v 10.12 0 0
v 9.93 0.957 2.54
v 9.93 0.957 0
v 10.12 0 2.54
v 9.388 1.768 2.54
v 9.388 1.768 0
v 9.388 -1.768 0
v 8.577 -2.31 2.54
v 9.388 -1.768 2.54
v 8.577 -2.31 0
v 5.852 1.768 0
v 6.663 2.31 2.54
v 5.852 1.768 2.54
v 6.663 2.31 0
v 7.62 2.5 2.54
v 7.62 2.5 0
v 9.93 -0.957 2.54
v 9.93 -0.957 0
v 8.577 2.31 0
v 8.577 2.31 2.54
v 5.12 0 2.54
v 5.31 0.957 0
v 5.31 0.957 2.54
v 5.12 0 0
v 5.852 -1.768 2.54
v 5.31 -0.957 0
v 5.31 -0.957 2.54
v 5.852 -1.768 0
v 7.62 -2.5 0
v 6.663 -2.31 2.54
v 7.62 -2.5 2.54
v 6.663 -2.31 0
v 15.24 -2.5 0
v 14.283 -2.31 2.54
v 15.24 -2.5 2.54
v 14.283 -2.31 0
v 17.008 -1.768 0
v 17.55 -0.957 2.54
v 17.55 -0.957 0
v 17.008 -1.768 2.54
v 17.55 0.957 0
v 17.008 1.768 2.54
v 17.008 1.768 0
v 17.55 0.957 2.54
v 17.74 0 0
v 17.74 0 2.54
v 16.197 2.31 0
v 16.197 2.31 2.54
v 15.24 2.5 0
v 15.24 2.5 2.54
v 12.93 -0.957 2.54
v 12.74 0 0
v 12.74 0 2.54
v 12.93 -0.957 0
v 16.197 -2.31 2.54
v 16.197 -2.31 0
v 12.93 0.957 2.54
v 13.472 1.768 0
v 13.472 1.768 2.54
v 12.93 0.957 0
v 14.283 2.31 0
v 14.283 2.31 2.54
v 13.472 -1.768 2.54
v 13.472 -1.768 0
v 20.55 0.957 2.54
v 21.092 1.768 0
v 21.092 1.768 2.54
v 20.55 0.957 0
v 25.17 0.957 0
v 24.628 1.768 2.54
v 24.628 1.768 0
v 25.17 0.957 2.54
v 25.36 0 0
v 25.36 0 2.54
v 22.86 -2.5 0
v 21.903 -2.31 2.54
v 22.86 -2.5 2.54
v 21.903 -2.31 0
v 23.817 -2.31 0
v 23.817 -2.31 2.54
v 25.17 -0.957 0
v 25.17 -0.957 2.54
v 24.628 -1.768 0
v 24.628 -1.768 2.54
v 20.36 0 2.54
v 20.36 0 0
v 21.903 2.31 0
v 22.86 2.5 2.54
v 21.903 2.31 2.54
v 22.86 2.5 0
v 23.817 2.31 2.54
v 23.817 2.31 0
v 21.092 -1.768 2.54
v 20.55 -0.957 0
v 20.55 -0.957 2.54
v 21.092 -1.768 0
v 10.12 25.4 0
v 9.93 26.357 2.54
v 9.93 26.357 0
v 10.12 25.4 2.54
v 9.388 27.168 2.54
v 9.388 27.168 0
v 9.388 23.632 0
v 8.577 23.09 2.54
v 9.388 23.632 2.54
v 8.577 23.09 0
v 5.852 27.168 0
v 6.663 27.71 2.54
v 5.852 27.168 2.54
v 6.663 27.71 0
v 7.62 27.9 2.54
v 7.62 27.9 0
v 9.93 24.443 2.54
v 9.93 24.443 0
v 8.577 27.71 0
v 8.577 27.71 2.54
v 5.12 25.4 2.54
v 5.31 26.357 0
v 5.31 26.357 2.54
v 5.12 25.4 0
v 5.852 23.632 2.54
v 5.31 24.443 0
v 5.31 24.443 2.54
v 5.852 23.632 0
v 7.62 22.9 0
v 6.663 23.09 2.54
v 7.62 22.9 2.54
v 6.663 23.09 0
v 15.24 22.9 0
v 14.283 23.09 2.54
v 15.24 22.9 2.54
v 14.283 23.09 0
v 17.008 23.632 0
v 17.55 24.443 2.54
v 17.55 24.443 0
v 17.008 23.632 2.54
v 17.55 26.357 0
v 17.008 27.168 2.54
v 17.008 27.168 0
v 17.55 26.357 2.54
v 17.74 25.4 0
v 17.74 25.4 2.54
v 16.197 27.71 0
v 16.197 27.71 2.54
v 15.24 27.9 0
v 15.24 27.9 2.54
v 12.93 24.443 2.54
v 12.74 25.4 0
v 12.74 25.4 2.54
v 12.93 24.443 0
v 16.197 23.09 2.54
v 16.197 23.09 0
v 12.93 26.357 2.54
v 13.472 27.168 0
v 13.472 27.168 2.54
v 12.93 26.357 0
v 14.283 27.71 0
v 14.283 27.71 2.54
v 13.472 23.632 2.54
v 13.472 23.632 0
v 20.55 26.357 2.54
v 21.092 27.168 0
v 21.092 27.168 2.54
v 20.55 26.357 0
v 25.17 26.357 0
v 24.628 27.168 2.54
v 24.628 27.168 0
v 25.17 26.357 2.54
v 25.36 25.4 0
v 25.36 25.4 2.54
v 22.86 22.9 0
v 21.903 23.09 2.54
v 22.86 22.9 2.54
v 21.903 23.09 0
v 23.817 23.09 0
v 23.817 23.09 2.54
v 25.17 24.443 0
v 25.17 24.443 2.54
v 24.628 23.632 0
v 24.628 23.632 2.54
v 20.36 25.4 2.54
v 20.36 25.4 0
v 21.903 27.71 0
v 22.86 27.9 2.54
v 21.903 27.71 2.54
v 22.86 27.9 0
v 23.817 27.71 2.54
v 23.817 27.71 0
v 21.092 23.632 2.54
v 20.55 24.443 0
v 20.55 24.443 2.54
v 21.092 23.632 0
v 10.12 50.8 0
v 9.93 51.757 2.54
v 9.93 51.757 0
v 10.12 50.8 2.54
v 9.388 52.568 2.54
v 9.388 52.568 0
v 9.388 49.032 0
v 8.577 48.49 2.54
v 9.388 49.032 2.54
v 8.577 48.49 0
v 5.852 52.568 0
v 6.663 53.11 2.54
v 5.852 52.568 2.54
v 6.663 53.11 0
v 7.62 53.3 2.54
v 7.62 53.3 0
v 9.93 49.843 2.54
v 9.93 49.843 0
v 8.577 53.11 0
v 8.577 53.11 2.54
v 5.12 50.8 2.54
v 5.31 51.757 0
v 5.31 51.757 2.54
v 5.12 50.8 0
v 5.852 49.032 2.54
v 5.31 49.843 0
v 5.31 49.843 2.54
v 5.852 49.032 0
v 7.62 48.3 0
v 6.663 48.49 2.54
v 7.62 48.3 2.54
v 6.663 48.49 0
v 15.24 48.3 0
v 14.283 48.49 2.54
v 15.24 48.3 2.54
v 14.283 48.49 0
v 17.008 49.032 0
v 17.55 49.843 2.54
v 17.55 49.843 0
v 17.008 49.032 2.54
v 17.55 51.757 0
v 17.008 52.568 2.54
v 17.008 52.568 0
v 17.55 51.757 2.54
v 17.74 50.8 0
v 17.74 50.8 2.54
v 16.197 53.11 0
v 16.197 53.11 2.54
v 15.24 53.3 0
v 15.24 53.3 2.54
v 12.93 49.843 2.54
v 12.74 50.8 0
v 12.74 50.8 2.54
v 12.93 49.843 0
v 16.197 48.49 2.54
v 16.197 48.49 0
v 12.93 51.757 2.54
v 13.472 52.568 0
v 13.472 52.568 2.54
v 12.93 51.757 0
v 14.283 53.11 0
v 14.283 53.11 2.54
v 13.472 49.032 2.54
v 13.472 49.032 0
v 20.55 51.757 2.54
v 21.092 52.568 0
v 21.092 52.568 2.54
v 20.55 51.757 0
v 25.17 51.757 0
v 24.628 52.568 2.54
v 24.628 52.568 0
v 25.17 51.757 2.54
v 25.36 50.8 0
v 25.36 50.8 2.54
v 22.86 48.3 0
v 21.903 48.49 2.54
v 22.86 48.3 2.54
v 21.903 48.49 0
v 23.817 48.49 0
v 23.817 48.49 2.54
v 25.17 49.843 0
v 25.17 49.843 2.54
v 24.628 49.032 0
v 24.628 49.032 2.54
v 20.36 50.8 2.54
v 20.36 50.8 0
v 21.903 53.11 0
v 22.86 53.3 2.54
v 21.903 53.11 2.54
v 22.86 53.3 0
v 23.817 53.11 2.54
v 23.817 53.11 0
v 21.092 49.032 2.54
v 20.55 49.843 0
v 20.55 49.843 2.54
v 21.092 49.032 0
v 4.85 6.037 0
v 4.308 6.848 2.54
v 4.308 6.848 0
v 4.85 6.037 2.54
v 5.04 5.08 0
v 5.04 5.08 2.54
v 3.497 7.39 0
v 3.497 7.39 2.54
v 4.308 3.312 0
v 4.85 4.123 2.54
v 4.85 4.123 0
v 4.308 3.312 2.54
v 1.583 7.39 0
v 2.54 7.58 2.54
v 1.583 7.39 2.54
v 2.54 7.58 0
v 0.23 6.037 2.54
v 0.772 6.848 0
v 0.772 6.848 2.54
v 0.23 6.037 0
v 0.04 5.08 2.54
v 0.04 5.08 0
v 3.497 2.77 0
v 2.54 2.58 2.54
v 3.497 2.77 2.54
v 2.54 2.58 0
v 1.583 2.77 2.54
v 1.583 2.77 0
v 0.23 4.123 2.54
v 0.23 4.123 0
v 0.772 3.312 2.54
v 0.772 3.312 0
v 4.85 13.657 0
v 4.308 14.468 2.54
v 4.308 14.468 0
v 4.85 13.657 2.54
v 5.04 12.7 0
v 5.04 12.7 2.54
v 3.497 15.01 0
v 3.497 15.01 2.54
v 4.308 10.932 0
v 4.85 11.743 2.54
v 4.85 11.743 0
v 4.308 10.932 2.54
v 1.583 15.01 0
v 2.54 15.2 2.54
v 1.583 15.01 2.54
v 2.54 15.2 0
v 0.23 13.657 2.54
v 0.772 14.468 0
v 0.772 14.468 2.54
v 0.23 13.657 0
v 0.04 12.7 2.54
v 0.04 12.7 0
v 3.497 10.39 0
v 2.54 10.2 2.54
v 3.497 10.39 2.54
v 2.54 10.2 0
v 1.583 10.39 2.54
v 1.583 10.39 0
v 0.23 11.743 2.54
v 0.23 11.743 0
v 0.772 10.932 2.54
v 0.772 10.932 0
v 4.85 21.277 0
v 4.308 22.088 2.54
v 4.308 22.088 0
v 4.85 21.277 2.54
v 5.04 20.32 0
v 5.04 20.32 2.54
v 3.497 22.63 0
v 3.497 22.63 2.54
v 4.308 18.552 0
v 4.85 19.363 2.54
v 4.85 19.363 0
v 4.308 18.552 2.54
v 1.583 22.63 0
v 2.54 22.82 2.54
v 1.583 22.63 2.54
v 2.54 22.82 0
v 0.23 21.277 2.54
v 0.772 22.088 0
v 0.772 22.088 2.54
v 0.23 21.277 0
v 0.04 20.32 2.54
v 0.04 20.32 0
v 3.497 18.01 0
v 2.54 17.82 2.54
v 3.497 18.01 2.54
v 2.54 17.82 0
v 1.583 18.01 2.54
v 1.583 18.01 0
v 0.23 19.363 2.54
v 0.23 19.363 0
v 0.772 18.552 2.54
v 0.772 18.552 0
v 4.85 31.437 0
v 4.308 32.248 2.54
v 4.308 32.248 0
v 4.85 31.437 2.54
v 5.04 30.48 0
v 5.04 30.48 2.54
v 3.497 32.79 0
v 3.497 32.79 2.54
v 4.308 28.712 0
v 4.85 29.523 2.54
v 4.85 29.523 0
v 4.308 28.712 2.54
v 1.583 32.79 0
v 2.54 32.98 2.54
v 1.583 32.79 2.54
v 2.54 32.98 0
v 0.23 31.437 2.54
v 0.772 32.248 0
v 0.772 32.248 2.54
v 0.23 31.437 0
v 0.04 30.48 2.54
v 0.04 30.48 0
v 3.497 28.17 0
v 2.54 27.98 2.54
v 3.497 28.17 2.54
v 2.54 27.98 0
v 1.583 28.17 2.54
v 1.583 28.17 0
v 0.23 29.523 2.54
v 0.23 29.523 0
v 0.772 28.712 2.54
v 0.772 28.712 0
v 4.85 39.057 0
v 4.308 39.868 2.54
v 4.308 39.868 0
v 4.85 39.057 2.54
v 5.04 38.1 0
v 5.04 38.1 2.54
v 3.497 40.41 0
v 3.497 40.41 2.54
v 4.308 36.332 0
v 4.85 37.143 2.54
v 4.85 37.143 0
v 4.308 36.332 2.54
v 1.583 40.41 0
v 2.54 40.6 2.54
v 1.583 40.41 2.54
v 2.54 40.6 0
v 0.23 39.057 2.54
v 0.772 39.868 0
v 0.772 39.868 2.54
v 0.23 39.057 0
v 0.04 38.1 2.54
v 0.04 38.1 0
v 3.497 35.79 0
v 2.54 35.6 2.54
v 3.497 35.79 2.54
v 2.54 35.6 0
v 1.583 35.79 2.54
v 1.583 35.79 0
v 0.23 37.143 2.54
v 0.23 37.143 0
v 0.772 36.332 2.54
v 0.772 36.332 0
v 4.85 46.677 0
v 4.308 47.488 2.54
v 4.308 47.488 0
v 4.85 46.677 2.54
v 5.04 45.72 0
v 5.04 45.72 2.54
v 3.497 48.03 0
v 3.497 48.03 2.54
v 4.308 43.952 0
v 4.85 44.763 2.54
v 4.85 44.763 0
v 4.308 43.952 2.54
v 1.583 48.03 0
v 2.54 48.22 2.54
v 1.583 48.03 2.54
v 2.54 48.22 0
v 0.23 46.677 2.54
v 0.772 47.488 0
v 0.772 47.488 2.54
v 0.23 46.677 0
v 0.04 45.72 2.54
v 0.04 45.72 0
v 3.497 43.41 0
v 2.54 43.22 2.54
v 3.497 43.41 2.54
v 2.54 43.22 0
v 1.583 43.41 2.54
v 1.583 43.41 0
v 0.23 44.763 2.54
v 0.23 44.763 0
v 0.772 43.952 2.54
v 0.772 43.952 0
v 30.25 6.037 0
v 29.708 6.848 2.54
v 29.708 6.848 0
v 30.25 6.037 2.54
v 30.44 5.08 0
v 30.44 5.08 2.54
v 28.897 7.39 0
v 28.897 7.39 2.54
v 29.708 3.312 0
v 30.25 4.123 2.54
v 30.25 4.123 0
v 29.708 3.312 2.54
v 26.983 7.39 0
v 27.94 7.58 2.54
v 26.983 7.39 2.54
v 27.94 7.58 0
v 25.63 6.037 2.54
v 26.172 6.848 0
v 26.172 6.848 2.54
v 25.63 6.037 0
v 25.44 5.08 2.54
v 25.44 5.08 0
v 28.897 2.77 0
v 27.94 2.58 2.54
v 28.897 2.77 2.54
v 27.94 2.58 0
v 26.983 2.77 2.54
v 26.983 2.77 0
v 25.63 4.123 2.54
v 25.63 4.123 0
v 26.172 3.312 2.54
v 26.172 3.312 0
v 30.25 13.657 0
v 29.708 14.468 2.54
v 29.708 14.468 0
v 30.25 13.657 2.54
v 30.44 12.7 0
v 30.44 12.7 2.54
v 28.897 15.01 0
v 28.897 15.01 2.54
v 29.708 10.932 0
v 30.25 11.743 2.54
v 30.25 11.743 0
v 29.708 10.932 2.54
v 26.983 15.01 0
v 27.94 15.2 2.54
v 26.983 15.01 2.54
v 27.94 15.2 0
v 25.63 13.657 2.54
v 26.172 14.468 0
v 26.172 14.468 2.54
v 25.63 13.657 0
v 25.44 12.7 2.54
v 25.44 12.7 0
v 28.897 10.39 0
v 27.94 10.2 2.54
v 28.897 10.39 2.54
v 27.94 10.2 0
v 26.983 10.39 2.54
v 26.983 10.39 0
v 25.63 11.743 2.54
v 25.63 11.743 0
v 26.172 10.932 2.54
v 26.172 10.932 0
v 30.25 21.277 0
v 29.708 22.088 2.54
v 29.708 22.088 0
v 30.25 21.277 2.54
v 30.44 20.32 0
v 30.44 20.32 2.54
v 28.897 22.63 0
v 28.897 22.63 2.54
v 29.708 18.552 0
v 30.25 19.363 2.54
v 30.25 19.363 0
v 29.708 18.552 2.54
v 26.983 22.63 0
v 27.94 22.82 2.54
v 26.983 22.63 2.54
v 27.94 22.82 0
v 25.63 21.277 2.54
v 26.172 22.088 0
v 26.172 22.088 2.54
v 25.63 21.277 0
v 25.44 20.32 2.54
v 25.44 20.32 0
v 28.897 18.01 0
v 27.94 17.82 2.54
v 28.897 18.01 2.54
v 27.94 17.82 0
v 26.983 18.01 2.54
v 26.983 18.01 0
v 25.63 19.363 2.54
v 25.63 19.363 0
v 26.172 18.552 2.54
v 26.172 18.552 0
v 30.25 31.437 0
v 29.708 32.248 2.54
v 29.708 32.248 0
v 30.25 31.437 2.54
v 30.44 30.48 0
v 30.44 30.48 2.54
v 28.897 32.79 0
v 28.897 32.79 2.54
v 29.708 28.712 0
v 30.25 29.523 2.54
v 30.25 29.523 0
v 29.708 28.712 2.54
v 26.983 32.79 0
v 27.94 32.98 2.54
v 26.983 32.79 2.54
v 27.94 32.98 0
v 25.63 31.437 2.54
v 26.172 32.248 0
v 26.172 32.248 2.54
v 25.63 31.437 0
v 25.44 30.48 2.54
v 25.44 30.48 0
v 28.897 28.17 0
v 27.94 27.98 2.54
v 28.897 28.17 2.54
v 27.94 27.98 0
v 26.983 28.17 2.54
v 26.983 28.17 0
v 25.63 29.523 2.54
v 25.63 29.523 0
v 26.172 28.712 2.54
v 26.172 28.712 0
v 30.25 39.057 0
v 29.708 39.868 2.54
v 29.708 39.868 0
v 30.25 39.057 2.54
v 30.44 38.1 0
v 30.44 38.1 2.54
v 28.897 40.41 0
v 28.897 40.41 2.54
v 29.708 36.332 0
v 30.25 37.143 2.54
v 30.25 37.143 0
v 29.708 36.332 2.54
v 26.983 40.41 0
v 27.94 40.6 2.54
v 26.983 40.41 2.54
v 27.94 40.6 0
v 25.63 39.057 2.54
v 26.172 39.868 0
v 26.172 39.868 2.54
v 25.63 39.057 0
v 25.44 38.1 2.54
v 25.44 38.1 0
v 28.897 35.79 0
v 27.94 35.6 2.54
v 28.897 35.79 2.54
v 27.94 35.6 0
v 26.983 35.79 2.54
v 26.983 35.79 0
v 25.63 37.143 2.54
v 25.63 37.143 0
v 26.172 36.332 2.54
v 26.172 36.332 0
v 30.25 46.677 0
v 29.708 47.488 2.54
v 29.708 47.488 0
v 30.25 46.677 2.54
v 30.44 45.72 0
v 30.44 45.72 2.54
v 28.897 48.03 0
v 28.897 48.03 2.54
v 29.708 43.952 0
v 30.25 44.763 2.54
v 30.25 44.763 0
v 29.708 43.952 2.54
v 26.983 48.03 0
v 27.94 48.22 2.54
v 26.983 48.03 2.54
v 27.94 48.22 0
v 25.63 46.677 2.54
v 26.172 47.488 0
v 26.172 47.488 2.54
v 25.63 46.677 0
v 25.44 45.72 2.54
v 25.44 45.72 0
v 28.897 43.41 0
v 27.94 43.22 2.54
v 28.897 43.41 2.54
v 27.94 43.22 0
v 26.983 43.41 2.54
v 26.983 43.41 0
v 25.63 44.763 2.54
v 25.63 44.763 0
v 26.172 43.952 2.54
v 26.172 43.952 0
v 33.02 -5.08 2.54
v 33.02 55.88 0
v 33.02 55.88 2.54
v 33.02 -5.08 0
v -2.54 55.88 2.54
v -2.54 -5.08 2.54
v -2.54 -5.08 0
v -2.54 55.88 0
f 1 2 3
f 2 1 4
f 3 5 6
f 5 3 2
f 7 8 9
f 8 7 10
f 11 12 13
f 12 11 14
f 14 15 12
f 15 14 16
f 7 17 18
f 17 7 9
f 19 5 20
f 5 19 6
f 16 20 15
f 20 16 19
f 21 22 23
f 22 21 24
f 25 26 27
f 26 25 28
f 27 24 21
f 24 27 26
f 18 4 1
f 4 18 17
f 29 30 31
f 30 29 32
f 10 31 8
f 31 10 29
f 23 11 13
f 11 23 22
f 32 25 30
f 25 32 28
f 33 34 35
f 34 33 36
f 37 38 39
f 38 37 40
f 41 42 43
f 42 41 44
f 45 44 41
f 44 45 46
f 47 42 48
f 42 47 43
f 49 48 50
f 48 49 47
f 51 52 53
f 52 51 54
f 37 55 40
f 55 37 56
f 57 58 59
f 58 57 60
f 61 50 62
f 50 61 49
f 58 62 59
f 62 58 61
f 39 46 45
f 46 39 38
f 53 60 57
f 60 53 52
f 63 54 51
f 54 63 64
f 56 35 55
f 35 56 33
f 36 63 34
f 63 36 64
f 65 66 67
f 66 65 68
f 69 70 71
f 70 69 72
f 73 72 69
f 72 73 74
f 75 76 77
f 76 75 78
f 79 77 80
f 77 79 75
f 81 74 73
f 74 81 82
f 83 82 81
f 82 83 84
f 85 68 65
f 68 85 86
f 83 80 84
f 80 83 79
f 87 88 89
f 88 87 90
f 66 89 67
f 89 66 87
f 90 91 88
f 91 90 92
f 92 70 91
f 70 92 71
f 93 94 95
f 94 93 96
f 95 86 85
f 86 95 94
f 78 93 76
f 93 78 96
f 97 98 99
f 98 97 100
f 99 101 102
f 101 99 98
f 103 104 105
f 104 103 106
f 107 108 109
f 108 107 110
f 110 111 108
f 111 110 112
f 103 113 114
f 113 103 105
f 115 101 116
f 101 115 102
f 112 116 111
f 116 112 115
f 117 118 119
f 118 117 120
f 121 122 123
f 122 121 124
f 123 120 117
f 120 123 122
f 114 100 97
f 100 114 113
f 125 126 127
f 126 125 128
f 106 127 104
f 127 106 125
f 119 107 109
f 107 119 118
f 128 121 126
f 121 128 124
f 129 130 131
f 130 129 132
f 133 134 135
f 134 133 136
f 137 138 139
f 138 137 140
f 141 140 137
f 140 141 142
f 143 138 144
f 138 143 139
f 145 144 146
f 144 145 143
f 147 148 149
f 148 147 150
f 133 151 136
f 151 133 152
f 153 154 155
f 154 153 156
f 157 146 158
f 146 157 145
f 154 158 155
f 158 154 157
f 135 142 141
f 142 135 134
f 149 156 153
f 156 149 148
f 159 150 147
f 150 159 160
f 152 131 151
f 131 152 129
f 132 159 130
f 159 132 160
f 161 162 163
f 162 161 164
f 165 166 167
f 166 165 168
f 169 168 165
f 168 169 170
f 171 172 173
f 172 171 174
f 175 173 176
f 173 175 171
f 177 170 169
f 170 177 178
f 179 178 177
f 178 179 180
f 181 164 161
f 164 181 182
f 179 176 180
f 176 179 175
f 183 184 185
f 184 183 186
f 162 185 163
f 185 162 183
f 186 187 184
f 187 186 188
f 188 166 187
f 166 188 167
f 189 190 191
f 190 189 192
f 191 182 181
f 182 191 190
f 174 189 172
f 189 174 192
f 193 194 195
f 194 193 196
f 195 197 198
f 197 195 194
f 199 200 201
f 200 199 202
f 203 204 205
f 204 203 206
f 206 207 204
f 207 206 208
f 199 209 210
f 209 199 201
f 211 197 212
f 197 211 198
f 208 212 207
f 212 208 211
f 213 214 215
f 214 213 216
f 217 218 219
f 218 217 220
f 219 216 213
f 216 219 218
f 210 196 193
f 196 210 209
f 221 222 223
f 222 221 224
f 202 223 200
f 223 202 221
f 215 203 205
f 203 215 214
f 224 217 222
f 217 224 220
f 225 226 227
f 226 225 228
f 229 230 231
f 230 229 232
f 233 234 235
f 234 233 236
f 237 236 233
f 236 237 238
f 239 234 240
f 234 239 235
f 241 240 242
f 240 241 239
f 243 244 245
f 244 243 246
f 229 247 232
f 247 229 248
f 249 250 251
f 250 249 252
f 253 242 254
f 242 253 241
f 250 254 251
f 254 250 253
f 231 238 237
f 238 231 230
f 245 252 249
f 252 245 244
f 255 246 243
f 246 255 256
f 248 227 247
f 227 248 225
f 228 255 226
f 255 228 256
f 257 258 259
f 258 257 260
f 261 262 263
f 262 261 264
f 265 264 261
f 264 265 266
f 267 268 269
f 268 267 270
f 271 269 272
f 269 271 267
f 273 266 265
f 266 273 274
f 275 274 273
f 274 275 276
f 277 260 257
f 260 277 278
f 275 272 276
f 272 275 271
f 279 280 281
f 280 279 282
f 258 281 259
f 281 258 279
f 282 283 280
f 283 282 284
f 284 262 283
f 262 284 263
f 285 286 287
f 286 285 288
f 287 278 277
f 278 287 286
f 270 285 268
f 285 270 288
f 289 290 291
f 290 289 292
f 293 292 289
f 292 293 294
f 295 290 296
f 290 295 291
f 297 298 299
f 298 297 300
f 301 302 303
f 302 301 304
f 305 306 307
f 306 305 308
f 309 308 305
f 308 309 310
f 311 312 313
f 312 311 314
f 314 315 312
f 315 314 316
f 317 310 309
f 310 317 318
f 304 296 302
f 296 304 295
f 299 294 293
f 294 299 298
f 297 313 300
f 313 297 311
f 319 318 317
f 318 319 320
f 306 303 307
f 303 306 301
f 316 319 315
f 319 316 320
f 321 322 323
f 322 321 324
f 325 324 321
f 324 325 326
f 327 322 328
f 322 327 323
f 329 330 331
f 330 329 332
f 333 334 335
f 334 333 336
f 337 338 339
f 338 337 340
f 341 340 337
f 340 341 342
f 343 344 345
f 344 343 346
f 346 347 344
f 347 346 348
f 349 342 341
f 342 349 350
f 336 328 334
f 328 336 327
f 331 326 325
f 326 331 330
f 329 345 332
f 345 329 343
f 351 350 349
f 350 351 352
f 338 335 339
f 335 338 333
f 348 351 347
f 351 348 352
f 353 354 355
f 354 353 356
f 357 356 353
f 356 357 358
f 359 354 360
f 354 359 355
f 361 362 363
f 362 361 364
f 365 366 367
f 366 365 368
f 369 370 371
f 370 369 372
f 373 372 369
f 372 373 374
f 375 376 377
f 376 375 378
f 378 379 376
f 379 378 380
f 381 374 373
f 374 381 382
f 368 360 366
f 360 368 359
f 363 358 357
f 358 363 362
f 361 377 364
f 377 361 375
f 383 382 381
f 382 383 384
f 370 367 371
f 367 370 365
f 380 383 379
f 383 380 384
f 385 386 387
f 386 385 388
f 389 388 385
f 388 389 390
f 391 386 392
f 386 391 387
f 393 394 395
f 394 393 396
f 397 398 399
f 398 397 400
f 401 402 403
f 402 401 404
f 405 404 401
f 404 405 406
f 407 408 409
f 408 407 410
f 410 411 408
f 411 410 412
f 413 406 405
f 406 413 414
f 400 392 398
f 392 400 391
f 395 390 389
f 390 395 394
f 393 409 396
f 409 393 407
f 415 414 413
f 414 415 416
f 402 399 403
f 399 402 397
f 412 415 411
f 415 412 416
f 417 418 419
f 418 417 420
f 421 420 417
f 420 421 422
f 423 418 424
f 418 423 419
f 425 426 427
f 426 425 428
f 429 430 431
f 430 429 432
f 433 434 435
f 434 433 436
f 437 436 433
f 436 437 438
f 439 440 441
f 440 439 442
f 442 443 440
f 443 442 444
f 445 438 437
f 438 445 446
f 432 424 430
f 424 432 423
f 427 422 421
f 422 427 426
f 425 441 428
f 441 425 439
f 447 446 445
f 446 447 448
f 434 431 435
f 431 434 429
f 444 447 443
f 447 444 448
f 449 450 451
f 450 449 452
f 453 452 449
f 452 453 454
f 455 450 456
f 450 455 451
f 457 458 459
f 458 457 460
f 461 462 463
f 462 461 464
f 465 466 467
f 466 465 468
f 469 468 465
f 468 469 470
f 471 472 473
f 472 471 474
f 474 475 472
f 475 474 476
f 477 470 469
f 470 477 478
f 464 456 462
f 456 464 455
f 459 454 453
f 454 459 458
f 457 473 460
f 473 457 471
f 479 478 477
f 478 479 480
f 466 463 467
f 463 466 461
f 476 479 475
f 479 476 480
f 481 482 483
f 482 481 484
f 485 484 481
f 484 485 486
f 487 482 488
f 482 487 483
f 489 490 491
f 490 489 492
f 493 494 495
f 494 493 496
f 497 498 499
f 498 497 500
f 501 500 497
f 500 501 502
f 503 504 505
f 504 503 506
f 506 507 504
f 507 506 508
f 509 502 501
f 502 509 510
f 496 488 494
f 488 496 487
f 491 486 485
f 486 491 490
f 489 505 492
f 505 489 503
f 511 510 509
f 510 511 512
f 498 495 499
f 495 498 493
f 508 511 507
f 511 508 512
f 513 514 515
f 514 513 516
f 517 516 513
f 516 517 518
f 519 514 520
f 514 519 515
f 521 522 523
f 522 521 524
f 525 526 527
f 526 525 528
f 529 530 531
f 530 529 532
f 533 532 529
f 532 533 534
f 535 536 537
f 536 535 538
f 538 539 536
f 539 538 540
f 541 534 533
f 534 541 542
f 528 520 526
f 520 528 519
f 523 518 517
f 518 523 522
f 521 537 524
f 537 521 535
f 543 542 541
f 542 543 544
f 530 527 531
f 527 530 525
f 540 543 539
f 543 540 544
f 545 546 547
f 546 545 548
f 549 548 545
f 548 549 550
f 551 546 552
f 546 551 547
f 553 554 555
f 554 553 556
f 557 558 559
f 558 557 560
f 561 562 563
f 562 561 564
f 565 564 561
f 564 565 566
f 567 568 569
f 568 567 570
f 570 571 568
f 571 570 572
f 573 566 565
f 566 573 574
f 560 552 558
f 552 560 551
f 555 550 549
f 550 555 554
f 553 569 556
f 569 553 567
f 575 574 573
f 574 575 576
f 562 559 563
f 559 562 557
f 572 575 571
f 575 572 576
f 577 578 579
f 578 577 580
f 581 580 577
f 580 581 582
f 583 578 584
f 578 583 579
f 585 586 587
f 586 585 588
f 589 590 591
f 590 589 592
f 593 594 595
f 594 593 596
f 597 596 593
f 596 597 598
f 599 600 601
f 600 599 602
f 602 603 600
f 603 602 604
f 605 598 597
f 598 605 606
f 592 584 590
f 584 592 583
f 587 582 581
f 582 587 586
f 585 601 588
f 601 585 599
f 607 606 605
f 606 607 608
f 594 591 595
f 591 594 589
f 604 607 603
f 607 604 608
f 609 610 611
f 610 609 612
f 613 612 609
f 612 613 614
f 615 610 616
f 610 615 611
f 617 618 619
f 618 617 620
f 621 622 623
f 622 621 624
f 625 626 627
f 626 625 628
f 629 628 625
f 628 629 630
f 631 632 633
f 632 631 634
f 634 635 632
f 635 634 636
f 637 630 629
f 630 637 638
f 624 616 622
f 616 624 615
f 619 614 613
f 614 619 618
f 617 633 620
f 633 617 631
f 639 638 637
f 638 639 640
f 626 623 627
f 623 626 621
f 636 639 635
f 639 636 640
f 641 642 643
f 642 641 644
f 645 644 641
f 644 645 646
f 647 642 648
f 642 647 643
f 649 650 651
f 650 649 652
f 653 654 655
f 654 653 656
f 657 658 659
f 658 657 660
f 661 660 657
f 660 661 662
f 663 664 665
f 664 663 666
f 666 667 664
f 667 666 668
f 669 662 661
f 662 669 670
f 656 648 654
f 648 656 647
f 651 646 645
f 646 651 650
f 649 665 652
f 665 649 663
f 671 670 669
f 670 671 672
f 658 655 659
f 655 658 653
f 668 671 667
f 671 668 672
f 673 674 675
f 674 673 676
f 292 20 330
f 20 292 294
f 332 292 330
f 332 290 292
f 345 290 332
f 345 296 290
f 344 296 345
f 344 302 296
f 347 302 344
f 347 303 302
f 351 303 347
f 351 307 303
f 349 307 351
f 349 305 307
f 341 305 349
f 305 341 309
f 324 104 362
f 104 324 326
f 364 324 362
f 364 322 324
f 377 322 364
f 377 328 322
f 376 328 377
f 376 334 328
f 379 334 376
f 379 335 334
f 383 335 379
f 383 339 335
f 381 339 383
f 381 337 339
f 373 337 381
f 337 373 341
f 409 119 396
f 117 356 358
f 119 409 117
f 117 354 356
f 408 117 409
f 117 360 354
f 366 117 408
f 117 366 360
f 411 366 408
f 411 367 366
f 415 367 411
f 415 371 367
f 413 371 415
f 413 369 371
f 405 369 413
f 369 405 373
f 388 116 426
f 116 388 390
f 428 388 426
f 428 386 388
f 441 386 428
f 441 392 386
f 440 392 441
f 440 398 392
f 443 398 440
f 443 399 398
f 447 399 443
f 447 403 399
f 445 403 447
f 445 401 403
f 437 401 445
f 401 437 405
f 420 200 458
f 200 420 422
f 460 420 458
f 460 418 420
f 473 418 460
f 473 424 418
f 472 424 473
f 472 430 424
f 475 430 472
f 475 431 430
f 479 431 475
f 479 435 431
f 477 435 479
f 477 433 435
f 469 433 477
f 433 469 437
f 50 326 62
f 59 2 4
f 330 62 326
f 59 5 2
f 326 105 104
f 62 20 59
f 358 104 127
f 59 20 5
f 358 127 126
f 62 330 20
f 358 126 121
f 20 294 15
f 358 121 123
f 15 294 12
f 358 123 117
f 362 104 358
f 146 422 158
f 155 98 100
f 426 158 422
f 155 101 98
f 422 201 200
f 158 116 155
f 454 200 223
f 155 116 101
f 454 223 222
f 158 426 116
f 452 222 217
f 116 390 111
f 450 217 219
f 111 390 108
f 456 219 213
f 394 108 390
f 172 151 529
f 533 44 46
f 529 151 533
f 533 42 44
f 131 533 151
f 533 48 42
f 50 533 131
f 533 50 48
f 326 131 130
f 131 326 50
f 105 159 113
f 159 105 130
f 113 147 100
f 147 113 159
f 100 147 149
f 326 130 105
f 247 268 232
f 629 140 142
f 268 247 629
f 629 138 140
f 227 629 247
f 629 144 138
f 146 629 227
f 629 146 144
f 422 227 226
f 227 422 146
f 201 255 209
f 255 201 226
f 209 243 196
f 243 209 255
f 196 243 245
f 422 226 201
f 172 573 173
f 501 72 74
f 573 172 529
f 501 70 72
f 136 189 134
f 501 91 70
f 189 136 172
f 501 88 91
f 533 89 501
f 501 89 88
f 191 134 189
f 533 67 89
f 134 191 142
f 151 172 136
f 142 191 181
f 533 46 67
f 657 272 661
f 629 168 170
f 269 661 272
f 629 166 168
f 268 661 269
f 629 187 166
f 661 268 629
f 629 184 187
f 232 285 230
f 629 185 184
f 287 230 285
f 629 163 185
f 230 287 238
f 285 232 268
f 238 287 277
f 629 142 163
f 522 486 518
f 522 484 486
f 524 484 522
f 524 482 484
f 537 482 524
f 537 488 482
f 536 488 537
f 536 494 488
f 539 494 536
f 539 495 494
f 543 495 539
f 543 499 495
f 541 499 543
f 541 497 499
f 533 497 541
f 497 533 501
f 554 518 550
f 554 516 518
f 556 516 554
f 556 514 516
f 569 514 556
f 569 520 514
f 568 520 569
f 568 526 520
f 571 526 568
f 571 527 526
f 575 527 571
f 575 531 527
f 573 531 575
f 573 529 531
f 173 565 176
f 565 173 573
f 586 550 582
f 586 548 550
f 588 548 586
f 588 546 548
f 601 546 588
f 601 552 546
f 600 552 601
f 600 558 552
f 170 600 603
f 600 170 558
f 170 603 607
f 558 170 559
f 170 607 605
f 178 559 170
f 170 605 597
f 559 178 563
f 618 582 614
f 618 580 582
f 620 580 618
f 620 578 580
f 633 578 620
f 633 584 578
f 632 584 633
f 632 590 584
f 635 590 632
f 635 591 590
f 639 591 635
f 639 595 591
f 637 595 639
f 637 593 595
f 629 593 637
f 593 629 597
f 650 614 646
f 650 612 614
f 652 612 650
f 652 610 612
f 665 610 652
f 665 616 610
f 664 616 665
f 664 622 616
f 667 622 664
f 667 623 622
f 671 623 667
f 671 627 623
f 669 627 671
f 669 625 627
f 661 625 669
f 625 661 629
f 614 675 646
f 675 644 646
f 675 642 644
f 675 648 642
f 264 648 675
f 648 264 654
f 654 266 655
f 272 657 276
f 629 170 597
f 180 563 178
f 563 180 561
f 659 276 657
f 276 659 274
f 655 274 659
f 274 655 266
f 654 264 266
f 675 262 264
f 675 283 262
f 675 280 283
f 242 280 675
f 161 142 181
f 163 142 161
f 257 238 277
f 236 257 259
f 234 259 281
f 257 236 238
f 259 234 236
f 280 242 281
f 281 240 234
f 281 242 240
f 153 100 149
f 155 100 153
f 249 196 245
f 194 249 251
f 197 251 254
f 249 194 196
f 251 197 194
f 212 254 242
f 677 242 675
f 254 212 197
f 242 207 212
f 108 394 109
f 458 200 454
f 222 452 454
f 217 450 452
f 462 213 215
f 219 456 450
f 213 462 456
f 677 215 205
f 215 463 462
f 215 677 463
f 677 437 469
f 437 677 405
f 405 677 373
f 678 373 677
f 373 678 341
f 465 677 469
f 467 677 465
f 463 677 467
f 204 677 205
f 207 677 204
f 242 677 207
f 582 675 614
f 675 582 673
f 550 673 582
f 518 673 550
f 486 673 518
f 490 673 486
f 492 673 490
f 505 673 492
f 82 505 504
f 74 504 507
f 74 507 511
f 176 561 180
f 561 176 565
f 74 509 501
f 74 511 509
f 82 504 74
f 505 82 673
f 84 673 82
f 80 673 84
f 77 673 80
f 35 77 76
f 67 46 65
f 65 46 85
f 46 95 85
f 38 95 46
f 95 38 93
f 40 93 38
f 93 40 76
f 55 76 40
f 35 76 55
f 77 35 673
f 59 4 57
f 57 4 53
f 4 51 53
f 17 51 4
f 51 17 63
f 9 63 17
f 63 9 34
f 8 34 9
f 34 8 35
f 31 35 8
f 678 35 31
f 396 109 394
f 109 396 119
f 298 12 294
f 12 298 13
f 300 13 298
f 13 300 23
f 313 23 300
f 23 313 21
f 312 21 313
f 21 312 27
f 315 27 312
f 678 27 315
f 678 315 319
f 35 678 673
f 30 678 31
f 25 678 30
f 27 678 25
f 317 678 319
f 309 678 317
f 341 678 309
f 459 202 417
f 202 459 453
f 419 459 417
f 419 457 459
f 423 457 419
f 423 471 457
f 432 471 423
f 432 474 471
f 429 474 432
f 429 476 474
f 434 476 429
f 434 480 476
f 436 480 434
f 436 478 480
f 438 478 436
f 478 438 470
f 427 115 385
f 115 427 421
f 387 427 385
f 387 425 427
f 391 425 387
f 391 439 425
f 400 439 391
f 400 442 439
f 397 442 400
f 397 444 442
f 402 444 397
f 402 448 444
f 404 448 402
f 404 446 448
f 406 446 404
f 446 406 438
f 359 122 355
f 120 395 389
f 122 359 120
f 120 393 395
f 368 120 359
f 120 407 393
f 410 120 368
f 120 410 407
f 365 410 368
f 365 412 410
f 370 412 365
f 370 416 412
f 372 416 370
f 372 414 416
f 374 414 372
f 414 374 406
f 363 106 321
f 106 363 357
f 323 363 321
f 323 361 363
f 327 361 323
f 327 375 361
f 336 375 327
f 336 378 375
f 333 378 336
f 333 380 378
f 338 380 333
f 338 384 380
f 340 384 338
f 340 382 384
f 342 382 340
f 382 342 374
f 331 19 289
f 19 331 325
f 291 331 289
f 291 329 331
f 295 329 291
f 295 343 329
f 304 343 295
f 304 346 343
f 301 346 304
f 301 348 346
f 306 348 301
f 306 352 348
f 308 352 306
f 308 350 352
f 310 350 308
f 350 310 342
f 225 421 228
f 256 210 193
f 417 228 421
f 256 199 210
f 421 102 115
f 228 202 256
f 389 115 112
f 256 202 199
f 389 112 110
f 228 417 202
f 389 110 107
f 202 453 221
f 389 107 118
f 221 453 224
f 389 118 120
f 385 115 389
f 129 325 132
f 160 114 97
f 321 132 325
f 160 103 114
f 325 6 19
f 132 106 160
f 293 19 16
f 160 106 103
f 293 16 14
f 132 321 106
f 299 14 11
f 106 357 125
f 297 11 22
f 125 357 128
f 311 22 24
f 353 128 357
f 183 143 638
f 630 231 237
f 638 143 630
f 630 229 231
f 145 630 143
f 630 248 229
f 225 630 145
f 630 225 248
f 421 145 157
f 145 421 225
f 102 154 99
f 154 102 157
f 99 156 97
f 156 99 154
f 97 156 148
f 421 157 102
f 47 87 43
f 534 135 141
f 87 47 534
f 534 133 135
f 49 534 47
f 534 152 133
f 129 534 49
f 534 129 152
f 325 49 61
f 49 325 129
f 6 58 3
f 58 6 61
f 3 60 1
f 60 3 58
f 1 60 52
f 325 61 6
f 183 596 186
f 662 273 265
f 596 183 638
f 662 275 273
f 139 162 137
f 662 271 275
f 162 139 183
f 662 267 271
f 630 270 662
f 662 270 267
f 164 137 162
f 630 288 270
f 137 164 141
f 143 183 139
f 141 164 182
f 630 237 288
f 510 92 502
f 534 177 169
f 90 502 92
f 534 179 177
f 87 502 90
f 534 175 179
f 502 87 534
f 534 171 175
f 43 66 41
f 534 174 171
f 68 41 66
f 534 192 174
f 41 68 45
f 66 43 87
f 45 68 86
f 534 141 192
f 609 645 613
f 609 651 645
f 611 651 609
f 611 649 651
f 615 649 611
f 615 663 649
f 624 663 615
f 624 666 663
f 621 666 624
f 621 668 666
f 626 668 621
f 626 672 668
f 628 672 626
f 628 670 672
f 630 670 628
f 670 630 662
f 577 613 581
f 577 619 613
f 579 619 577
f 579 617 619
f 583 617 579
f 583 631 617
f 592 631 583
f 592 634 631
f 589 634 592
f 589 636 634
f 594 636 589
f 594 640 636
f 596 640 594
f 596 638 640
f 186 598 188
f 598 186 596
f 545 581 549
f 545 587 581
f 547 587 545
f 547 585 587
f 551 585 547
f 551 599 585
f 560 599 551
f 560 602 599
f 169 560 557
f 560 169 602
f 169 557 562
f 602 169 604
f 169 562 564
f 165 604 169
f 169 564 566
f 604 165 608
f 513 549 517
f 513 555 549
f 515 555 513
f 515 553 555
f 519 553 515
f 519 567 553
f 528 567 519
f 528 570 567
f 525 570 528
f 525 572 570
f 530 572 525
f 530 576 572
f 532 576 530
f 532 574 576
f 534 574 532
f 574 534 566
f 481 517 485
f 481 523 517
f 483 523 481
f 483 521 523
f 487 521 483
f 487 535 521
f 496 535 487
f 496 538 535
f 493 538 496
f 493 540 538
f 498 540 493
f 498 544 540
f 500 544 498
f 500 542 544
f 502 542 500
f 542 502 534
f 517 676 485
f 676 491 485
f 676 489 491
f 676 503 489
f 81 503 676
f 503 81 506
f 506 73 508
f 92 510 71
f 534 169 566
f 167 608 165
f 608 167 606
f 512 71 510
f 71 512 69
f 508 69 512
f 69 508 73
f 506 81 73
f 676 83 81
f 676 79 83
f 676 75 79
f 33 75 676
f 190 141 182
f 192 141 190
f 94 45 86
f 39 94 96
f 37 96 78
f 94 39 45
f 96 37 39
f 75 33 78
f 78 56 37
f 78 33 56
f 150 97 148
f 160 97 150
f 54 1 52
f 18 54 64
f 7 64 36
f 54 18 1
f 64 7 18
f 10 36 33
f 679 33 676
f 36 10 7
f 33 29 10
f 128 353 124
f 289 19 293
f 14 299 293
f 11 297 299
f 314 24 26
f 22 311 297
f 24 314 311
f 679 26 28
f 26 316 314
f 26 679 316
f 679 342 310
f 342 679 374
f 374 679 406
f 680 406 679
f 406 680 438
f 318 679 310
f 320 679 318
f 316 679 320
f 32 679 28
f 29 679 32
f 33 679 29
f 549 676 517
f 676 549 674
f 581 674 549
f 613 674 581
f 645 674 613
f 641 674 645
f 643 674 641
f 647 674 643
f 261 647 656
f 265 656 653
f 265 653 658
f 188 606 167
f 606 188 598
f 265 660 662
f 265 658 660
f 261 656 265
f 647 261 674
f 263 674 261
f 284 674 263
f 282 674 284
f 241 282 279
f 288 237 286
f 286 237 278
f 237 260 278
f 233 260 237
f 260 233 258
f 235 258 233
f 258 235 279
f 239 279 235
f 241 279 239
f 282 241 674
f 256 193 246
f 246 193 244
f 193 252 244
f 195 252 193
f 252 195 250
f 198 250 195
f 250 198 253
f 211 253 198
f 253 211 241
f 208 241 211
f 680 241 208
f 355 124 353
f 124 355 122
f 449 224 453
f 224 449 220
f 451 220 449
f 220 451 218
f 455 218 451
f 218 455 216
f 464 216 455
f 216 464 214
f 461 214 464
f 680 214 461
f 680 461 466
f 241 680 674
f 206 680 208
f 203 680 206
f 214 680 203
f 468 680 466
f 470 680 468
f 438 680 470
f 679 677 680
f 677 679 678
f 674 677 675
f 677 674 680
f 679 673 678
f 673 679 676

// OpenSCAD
grid=2.54;
unit_height=2.54;
hole_size=5;

number_of_units=1;

//  - segment
module horizontal_segment()
 {
union()
{
translate([2*grid,0,-1])
cylinder(h=unit_height+2,r=hole_size/2,$fn=16);
translate([5*grid,0,-1])
cylinder(h=unit_height+2,r=hole_size/2,$fn=16);
translate([8*grid,0,-1])
cylinder(h=unit_height+2,r=hole_size/2,$fn=16);
}
}

// | Segment
module vertical_segment()
{
union()
{
translate([0,2*grid,-1])
cylinder(h=unit_height+2,r=hole_size/2,$fn=16);
translate([0,5*grid,-1])
cylinder(h=unit_height+2,r=hole_size/2,$fn=16);
translate([0,8*grid,-1])
cylinder(h=unit_height+2,r=hole_size/2,$fn=16);
}
}

module display_unit()
{
difference()
{
translate([-2*grid,-2*grid,0])
cube ([14*grid,24*grid,unit_height]);

translate([0,0,0])
horizontal_segment();
translate([0,10*grid,0])
horizontal_segment();
translate([0,20*grid,0])
horizontal_segment();

translate([0,0,0])
vertical_segment();
translate([0,10*grid,0])
vertical_segment();
translate([10*grid,0,0])
vertical_segment();
translate([10*grid,10*grid,0])
vertical_segment();
}
}

for (i=[1:14:number_of_units*14])
{
translate([i*grid,0,0])
display_unit();
}

